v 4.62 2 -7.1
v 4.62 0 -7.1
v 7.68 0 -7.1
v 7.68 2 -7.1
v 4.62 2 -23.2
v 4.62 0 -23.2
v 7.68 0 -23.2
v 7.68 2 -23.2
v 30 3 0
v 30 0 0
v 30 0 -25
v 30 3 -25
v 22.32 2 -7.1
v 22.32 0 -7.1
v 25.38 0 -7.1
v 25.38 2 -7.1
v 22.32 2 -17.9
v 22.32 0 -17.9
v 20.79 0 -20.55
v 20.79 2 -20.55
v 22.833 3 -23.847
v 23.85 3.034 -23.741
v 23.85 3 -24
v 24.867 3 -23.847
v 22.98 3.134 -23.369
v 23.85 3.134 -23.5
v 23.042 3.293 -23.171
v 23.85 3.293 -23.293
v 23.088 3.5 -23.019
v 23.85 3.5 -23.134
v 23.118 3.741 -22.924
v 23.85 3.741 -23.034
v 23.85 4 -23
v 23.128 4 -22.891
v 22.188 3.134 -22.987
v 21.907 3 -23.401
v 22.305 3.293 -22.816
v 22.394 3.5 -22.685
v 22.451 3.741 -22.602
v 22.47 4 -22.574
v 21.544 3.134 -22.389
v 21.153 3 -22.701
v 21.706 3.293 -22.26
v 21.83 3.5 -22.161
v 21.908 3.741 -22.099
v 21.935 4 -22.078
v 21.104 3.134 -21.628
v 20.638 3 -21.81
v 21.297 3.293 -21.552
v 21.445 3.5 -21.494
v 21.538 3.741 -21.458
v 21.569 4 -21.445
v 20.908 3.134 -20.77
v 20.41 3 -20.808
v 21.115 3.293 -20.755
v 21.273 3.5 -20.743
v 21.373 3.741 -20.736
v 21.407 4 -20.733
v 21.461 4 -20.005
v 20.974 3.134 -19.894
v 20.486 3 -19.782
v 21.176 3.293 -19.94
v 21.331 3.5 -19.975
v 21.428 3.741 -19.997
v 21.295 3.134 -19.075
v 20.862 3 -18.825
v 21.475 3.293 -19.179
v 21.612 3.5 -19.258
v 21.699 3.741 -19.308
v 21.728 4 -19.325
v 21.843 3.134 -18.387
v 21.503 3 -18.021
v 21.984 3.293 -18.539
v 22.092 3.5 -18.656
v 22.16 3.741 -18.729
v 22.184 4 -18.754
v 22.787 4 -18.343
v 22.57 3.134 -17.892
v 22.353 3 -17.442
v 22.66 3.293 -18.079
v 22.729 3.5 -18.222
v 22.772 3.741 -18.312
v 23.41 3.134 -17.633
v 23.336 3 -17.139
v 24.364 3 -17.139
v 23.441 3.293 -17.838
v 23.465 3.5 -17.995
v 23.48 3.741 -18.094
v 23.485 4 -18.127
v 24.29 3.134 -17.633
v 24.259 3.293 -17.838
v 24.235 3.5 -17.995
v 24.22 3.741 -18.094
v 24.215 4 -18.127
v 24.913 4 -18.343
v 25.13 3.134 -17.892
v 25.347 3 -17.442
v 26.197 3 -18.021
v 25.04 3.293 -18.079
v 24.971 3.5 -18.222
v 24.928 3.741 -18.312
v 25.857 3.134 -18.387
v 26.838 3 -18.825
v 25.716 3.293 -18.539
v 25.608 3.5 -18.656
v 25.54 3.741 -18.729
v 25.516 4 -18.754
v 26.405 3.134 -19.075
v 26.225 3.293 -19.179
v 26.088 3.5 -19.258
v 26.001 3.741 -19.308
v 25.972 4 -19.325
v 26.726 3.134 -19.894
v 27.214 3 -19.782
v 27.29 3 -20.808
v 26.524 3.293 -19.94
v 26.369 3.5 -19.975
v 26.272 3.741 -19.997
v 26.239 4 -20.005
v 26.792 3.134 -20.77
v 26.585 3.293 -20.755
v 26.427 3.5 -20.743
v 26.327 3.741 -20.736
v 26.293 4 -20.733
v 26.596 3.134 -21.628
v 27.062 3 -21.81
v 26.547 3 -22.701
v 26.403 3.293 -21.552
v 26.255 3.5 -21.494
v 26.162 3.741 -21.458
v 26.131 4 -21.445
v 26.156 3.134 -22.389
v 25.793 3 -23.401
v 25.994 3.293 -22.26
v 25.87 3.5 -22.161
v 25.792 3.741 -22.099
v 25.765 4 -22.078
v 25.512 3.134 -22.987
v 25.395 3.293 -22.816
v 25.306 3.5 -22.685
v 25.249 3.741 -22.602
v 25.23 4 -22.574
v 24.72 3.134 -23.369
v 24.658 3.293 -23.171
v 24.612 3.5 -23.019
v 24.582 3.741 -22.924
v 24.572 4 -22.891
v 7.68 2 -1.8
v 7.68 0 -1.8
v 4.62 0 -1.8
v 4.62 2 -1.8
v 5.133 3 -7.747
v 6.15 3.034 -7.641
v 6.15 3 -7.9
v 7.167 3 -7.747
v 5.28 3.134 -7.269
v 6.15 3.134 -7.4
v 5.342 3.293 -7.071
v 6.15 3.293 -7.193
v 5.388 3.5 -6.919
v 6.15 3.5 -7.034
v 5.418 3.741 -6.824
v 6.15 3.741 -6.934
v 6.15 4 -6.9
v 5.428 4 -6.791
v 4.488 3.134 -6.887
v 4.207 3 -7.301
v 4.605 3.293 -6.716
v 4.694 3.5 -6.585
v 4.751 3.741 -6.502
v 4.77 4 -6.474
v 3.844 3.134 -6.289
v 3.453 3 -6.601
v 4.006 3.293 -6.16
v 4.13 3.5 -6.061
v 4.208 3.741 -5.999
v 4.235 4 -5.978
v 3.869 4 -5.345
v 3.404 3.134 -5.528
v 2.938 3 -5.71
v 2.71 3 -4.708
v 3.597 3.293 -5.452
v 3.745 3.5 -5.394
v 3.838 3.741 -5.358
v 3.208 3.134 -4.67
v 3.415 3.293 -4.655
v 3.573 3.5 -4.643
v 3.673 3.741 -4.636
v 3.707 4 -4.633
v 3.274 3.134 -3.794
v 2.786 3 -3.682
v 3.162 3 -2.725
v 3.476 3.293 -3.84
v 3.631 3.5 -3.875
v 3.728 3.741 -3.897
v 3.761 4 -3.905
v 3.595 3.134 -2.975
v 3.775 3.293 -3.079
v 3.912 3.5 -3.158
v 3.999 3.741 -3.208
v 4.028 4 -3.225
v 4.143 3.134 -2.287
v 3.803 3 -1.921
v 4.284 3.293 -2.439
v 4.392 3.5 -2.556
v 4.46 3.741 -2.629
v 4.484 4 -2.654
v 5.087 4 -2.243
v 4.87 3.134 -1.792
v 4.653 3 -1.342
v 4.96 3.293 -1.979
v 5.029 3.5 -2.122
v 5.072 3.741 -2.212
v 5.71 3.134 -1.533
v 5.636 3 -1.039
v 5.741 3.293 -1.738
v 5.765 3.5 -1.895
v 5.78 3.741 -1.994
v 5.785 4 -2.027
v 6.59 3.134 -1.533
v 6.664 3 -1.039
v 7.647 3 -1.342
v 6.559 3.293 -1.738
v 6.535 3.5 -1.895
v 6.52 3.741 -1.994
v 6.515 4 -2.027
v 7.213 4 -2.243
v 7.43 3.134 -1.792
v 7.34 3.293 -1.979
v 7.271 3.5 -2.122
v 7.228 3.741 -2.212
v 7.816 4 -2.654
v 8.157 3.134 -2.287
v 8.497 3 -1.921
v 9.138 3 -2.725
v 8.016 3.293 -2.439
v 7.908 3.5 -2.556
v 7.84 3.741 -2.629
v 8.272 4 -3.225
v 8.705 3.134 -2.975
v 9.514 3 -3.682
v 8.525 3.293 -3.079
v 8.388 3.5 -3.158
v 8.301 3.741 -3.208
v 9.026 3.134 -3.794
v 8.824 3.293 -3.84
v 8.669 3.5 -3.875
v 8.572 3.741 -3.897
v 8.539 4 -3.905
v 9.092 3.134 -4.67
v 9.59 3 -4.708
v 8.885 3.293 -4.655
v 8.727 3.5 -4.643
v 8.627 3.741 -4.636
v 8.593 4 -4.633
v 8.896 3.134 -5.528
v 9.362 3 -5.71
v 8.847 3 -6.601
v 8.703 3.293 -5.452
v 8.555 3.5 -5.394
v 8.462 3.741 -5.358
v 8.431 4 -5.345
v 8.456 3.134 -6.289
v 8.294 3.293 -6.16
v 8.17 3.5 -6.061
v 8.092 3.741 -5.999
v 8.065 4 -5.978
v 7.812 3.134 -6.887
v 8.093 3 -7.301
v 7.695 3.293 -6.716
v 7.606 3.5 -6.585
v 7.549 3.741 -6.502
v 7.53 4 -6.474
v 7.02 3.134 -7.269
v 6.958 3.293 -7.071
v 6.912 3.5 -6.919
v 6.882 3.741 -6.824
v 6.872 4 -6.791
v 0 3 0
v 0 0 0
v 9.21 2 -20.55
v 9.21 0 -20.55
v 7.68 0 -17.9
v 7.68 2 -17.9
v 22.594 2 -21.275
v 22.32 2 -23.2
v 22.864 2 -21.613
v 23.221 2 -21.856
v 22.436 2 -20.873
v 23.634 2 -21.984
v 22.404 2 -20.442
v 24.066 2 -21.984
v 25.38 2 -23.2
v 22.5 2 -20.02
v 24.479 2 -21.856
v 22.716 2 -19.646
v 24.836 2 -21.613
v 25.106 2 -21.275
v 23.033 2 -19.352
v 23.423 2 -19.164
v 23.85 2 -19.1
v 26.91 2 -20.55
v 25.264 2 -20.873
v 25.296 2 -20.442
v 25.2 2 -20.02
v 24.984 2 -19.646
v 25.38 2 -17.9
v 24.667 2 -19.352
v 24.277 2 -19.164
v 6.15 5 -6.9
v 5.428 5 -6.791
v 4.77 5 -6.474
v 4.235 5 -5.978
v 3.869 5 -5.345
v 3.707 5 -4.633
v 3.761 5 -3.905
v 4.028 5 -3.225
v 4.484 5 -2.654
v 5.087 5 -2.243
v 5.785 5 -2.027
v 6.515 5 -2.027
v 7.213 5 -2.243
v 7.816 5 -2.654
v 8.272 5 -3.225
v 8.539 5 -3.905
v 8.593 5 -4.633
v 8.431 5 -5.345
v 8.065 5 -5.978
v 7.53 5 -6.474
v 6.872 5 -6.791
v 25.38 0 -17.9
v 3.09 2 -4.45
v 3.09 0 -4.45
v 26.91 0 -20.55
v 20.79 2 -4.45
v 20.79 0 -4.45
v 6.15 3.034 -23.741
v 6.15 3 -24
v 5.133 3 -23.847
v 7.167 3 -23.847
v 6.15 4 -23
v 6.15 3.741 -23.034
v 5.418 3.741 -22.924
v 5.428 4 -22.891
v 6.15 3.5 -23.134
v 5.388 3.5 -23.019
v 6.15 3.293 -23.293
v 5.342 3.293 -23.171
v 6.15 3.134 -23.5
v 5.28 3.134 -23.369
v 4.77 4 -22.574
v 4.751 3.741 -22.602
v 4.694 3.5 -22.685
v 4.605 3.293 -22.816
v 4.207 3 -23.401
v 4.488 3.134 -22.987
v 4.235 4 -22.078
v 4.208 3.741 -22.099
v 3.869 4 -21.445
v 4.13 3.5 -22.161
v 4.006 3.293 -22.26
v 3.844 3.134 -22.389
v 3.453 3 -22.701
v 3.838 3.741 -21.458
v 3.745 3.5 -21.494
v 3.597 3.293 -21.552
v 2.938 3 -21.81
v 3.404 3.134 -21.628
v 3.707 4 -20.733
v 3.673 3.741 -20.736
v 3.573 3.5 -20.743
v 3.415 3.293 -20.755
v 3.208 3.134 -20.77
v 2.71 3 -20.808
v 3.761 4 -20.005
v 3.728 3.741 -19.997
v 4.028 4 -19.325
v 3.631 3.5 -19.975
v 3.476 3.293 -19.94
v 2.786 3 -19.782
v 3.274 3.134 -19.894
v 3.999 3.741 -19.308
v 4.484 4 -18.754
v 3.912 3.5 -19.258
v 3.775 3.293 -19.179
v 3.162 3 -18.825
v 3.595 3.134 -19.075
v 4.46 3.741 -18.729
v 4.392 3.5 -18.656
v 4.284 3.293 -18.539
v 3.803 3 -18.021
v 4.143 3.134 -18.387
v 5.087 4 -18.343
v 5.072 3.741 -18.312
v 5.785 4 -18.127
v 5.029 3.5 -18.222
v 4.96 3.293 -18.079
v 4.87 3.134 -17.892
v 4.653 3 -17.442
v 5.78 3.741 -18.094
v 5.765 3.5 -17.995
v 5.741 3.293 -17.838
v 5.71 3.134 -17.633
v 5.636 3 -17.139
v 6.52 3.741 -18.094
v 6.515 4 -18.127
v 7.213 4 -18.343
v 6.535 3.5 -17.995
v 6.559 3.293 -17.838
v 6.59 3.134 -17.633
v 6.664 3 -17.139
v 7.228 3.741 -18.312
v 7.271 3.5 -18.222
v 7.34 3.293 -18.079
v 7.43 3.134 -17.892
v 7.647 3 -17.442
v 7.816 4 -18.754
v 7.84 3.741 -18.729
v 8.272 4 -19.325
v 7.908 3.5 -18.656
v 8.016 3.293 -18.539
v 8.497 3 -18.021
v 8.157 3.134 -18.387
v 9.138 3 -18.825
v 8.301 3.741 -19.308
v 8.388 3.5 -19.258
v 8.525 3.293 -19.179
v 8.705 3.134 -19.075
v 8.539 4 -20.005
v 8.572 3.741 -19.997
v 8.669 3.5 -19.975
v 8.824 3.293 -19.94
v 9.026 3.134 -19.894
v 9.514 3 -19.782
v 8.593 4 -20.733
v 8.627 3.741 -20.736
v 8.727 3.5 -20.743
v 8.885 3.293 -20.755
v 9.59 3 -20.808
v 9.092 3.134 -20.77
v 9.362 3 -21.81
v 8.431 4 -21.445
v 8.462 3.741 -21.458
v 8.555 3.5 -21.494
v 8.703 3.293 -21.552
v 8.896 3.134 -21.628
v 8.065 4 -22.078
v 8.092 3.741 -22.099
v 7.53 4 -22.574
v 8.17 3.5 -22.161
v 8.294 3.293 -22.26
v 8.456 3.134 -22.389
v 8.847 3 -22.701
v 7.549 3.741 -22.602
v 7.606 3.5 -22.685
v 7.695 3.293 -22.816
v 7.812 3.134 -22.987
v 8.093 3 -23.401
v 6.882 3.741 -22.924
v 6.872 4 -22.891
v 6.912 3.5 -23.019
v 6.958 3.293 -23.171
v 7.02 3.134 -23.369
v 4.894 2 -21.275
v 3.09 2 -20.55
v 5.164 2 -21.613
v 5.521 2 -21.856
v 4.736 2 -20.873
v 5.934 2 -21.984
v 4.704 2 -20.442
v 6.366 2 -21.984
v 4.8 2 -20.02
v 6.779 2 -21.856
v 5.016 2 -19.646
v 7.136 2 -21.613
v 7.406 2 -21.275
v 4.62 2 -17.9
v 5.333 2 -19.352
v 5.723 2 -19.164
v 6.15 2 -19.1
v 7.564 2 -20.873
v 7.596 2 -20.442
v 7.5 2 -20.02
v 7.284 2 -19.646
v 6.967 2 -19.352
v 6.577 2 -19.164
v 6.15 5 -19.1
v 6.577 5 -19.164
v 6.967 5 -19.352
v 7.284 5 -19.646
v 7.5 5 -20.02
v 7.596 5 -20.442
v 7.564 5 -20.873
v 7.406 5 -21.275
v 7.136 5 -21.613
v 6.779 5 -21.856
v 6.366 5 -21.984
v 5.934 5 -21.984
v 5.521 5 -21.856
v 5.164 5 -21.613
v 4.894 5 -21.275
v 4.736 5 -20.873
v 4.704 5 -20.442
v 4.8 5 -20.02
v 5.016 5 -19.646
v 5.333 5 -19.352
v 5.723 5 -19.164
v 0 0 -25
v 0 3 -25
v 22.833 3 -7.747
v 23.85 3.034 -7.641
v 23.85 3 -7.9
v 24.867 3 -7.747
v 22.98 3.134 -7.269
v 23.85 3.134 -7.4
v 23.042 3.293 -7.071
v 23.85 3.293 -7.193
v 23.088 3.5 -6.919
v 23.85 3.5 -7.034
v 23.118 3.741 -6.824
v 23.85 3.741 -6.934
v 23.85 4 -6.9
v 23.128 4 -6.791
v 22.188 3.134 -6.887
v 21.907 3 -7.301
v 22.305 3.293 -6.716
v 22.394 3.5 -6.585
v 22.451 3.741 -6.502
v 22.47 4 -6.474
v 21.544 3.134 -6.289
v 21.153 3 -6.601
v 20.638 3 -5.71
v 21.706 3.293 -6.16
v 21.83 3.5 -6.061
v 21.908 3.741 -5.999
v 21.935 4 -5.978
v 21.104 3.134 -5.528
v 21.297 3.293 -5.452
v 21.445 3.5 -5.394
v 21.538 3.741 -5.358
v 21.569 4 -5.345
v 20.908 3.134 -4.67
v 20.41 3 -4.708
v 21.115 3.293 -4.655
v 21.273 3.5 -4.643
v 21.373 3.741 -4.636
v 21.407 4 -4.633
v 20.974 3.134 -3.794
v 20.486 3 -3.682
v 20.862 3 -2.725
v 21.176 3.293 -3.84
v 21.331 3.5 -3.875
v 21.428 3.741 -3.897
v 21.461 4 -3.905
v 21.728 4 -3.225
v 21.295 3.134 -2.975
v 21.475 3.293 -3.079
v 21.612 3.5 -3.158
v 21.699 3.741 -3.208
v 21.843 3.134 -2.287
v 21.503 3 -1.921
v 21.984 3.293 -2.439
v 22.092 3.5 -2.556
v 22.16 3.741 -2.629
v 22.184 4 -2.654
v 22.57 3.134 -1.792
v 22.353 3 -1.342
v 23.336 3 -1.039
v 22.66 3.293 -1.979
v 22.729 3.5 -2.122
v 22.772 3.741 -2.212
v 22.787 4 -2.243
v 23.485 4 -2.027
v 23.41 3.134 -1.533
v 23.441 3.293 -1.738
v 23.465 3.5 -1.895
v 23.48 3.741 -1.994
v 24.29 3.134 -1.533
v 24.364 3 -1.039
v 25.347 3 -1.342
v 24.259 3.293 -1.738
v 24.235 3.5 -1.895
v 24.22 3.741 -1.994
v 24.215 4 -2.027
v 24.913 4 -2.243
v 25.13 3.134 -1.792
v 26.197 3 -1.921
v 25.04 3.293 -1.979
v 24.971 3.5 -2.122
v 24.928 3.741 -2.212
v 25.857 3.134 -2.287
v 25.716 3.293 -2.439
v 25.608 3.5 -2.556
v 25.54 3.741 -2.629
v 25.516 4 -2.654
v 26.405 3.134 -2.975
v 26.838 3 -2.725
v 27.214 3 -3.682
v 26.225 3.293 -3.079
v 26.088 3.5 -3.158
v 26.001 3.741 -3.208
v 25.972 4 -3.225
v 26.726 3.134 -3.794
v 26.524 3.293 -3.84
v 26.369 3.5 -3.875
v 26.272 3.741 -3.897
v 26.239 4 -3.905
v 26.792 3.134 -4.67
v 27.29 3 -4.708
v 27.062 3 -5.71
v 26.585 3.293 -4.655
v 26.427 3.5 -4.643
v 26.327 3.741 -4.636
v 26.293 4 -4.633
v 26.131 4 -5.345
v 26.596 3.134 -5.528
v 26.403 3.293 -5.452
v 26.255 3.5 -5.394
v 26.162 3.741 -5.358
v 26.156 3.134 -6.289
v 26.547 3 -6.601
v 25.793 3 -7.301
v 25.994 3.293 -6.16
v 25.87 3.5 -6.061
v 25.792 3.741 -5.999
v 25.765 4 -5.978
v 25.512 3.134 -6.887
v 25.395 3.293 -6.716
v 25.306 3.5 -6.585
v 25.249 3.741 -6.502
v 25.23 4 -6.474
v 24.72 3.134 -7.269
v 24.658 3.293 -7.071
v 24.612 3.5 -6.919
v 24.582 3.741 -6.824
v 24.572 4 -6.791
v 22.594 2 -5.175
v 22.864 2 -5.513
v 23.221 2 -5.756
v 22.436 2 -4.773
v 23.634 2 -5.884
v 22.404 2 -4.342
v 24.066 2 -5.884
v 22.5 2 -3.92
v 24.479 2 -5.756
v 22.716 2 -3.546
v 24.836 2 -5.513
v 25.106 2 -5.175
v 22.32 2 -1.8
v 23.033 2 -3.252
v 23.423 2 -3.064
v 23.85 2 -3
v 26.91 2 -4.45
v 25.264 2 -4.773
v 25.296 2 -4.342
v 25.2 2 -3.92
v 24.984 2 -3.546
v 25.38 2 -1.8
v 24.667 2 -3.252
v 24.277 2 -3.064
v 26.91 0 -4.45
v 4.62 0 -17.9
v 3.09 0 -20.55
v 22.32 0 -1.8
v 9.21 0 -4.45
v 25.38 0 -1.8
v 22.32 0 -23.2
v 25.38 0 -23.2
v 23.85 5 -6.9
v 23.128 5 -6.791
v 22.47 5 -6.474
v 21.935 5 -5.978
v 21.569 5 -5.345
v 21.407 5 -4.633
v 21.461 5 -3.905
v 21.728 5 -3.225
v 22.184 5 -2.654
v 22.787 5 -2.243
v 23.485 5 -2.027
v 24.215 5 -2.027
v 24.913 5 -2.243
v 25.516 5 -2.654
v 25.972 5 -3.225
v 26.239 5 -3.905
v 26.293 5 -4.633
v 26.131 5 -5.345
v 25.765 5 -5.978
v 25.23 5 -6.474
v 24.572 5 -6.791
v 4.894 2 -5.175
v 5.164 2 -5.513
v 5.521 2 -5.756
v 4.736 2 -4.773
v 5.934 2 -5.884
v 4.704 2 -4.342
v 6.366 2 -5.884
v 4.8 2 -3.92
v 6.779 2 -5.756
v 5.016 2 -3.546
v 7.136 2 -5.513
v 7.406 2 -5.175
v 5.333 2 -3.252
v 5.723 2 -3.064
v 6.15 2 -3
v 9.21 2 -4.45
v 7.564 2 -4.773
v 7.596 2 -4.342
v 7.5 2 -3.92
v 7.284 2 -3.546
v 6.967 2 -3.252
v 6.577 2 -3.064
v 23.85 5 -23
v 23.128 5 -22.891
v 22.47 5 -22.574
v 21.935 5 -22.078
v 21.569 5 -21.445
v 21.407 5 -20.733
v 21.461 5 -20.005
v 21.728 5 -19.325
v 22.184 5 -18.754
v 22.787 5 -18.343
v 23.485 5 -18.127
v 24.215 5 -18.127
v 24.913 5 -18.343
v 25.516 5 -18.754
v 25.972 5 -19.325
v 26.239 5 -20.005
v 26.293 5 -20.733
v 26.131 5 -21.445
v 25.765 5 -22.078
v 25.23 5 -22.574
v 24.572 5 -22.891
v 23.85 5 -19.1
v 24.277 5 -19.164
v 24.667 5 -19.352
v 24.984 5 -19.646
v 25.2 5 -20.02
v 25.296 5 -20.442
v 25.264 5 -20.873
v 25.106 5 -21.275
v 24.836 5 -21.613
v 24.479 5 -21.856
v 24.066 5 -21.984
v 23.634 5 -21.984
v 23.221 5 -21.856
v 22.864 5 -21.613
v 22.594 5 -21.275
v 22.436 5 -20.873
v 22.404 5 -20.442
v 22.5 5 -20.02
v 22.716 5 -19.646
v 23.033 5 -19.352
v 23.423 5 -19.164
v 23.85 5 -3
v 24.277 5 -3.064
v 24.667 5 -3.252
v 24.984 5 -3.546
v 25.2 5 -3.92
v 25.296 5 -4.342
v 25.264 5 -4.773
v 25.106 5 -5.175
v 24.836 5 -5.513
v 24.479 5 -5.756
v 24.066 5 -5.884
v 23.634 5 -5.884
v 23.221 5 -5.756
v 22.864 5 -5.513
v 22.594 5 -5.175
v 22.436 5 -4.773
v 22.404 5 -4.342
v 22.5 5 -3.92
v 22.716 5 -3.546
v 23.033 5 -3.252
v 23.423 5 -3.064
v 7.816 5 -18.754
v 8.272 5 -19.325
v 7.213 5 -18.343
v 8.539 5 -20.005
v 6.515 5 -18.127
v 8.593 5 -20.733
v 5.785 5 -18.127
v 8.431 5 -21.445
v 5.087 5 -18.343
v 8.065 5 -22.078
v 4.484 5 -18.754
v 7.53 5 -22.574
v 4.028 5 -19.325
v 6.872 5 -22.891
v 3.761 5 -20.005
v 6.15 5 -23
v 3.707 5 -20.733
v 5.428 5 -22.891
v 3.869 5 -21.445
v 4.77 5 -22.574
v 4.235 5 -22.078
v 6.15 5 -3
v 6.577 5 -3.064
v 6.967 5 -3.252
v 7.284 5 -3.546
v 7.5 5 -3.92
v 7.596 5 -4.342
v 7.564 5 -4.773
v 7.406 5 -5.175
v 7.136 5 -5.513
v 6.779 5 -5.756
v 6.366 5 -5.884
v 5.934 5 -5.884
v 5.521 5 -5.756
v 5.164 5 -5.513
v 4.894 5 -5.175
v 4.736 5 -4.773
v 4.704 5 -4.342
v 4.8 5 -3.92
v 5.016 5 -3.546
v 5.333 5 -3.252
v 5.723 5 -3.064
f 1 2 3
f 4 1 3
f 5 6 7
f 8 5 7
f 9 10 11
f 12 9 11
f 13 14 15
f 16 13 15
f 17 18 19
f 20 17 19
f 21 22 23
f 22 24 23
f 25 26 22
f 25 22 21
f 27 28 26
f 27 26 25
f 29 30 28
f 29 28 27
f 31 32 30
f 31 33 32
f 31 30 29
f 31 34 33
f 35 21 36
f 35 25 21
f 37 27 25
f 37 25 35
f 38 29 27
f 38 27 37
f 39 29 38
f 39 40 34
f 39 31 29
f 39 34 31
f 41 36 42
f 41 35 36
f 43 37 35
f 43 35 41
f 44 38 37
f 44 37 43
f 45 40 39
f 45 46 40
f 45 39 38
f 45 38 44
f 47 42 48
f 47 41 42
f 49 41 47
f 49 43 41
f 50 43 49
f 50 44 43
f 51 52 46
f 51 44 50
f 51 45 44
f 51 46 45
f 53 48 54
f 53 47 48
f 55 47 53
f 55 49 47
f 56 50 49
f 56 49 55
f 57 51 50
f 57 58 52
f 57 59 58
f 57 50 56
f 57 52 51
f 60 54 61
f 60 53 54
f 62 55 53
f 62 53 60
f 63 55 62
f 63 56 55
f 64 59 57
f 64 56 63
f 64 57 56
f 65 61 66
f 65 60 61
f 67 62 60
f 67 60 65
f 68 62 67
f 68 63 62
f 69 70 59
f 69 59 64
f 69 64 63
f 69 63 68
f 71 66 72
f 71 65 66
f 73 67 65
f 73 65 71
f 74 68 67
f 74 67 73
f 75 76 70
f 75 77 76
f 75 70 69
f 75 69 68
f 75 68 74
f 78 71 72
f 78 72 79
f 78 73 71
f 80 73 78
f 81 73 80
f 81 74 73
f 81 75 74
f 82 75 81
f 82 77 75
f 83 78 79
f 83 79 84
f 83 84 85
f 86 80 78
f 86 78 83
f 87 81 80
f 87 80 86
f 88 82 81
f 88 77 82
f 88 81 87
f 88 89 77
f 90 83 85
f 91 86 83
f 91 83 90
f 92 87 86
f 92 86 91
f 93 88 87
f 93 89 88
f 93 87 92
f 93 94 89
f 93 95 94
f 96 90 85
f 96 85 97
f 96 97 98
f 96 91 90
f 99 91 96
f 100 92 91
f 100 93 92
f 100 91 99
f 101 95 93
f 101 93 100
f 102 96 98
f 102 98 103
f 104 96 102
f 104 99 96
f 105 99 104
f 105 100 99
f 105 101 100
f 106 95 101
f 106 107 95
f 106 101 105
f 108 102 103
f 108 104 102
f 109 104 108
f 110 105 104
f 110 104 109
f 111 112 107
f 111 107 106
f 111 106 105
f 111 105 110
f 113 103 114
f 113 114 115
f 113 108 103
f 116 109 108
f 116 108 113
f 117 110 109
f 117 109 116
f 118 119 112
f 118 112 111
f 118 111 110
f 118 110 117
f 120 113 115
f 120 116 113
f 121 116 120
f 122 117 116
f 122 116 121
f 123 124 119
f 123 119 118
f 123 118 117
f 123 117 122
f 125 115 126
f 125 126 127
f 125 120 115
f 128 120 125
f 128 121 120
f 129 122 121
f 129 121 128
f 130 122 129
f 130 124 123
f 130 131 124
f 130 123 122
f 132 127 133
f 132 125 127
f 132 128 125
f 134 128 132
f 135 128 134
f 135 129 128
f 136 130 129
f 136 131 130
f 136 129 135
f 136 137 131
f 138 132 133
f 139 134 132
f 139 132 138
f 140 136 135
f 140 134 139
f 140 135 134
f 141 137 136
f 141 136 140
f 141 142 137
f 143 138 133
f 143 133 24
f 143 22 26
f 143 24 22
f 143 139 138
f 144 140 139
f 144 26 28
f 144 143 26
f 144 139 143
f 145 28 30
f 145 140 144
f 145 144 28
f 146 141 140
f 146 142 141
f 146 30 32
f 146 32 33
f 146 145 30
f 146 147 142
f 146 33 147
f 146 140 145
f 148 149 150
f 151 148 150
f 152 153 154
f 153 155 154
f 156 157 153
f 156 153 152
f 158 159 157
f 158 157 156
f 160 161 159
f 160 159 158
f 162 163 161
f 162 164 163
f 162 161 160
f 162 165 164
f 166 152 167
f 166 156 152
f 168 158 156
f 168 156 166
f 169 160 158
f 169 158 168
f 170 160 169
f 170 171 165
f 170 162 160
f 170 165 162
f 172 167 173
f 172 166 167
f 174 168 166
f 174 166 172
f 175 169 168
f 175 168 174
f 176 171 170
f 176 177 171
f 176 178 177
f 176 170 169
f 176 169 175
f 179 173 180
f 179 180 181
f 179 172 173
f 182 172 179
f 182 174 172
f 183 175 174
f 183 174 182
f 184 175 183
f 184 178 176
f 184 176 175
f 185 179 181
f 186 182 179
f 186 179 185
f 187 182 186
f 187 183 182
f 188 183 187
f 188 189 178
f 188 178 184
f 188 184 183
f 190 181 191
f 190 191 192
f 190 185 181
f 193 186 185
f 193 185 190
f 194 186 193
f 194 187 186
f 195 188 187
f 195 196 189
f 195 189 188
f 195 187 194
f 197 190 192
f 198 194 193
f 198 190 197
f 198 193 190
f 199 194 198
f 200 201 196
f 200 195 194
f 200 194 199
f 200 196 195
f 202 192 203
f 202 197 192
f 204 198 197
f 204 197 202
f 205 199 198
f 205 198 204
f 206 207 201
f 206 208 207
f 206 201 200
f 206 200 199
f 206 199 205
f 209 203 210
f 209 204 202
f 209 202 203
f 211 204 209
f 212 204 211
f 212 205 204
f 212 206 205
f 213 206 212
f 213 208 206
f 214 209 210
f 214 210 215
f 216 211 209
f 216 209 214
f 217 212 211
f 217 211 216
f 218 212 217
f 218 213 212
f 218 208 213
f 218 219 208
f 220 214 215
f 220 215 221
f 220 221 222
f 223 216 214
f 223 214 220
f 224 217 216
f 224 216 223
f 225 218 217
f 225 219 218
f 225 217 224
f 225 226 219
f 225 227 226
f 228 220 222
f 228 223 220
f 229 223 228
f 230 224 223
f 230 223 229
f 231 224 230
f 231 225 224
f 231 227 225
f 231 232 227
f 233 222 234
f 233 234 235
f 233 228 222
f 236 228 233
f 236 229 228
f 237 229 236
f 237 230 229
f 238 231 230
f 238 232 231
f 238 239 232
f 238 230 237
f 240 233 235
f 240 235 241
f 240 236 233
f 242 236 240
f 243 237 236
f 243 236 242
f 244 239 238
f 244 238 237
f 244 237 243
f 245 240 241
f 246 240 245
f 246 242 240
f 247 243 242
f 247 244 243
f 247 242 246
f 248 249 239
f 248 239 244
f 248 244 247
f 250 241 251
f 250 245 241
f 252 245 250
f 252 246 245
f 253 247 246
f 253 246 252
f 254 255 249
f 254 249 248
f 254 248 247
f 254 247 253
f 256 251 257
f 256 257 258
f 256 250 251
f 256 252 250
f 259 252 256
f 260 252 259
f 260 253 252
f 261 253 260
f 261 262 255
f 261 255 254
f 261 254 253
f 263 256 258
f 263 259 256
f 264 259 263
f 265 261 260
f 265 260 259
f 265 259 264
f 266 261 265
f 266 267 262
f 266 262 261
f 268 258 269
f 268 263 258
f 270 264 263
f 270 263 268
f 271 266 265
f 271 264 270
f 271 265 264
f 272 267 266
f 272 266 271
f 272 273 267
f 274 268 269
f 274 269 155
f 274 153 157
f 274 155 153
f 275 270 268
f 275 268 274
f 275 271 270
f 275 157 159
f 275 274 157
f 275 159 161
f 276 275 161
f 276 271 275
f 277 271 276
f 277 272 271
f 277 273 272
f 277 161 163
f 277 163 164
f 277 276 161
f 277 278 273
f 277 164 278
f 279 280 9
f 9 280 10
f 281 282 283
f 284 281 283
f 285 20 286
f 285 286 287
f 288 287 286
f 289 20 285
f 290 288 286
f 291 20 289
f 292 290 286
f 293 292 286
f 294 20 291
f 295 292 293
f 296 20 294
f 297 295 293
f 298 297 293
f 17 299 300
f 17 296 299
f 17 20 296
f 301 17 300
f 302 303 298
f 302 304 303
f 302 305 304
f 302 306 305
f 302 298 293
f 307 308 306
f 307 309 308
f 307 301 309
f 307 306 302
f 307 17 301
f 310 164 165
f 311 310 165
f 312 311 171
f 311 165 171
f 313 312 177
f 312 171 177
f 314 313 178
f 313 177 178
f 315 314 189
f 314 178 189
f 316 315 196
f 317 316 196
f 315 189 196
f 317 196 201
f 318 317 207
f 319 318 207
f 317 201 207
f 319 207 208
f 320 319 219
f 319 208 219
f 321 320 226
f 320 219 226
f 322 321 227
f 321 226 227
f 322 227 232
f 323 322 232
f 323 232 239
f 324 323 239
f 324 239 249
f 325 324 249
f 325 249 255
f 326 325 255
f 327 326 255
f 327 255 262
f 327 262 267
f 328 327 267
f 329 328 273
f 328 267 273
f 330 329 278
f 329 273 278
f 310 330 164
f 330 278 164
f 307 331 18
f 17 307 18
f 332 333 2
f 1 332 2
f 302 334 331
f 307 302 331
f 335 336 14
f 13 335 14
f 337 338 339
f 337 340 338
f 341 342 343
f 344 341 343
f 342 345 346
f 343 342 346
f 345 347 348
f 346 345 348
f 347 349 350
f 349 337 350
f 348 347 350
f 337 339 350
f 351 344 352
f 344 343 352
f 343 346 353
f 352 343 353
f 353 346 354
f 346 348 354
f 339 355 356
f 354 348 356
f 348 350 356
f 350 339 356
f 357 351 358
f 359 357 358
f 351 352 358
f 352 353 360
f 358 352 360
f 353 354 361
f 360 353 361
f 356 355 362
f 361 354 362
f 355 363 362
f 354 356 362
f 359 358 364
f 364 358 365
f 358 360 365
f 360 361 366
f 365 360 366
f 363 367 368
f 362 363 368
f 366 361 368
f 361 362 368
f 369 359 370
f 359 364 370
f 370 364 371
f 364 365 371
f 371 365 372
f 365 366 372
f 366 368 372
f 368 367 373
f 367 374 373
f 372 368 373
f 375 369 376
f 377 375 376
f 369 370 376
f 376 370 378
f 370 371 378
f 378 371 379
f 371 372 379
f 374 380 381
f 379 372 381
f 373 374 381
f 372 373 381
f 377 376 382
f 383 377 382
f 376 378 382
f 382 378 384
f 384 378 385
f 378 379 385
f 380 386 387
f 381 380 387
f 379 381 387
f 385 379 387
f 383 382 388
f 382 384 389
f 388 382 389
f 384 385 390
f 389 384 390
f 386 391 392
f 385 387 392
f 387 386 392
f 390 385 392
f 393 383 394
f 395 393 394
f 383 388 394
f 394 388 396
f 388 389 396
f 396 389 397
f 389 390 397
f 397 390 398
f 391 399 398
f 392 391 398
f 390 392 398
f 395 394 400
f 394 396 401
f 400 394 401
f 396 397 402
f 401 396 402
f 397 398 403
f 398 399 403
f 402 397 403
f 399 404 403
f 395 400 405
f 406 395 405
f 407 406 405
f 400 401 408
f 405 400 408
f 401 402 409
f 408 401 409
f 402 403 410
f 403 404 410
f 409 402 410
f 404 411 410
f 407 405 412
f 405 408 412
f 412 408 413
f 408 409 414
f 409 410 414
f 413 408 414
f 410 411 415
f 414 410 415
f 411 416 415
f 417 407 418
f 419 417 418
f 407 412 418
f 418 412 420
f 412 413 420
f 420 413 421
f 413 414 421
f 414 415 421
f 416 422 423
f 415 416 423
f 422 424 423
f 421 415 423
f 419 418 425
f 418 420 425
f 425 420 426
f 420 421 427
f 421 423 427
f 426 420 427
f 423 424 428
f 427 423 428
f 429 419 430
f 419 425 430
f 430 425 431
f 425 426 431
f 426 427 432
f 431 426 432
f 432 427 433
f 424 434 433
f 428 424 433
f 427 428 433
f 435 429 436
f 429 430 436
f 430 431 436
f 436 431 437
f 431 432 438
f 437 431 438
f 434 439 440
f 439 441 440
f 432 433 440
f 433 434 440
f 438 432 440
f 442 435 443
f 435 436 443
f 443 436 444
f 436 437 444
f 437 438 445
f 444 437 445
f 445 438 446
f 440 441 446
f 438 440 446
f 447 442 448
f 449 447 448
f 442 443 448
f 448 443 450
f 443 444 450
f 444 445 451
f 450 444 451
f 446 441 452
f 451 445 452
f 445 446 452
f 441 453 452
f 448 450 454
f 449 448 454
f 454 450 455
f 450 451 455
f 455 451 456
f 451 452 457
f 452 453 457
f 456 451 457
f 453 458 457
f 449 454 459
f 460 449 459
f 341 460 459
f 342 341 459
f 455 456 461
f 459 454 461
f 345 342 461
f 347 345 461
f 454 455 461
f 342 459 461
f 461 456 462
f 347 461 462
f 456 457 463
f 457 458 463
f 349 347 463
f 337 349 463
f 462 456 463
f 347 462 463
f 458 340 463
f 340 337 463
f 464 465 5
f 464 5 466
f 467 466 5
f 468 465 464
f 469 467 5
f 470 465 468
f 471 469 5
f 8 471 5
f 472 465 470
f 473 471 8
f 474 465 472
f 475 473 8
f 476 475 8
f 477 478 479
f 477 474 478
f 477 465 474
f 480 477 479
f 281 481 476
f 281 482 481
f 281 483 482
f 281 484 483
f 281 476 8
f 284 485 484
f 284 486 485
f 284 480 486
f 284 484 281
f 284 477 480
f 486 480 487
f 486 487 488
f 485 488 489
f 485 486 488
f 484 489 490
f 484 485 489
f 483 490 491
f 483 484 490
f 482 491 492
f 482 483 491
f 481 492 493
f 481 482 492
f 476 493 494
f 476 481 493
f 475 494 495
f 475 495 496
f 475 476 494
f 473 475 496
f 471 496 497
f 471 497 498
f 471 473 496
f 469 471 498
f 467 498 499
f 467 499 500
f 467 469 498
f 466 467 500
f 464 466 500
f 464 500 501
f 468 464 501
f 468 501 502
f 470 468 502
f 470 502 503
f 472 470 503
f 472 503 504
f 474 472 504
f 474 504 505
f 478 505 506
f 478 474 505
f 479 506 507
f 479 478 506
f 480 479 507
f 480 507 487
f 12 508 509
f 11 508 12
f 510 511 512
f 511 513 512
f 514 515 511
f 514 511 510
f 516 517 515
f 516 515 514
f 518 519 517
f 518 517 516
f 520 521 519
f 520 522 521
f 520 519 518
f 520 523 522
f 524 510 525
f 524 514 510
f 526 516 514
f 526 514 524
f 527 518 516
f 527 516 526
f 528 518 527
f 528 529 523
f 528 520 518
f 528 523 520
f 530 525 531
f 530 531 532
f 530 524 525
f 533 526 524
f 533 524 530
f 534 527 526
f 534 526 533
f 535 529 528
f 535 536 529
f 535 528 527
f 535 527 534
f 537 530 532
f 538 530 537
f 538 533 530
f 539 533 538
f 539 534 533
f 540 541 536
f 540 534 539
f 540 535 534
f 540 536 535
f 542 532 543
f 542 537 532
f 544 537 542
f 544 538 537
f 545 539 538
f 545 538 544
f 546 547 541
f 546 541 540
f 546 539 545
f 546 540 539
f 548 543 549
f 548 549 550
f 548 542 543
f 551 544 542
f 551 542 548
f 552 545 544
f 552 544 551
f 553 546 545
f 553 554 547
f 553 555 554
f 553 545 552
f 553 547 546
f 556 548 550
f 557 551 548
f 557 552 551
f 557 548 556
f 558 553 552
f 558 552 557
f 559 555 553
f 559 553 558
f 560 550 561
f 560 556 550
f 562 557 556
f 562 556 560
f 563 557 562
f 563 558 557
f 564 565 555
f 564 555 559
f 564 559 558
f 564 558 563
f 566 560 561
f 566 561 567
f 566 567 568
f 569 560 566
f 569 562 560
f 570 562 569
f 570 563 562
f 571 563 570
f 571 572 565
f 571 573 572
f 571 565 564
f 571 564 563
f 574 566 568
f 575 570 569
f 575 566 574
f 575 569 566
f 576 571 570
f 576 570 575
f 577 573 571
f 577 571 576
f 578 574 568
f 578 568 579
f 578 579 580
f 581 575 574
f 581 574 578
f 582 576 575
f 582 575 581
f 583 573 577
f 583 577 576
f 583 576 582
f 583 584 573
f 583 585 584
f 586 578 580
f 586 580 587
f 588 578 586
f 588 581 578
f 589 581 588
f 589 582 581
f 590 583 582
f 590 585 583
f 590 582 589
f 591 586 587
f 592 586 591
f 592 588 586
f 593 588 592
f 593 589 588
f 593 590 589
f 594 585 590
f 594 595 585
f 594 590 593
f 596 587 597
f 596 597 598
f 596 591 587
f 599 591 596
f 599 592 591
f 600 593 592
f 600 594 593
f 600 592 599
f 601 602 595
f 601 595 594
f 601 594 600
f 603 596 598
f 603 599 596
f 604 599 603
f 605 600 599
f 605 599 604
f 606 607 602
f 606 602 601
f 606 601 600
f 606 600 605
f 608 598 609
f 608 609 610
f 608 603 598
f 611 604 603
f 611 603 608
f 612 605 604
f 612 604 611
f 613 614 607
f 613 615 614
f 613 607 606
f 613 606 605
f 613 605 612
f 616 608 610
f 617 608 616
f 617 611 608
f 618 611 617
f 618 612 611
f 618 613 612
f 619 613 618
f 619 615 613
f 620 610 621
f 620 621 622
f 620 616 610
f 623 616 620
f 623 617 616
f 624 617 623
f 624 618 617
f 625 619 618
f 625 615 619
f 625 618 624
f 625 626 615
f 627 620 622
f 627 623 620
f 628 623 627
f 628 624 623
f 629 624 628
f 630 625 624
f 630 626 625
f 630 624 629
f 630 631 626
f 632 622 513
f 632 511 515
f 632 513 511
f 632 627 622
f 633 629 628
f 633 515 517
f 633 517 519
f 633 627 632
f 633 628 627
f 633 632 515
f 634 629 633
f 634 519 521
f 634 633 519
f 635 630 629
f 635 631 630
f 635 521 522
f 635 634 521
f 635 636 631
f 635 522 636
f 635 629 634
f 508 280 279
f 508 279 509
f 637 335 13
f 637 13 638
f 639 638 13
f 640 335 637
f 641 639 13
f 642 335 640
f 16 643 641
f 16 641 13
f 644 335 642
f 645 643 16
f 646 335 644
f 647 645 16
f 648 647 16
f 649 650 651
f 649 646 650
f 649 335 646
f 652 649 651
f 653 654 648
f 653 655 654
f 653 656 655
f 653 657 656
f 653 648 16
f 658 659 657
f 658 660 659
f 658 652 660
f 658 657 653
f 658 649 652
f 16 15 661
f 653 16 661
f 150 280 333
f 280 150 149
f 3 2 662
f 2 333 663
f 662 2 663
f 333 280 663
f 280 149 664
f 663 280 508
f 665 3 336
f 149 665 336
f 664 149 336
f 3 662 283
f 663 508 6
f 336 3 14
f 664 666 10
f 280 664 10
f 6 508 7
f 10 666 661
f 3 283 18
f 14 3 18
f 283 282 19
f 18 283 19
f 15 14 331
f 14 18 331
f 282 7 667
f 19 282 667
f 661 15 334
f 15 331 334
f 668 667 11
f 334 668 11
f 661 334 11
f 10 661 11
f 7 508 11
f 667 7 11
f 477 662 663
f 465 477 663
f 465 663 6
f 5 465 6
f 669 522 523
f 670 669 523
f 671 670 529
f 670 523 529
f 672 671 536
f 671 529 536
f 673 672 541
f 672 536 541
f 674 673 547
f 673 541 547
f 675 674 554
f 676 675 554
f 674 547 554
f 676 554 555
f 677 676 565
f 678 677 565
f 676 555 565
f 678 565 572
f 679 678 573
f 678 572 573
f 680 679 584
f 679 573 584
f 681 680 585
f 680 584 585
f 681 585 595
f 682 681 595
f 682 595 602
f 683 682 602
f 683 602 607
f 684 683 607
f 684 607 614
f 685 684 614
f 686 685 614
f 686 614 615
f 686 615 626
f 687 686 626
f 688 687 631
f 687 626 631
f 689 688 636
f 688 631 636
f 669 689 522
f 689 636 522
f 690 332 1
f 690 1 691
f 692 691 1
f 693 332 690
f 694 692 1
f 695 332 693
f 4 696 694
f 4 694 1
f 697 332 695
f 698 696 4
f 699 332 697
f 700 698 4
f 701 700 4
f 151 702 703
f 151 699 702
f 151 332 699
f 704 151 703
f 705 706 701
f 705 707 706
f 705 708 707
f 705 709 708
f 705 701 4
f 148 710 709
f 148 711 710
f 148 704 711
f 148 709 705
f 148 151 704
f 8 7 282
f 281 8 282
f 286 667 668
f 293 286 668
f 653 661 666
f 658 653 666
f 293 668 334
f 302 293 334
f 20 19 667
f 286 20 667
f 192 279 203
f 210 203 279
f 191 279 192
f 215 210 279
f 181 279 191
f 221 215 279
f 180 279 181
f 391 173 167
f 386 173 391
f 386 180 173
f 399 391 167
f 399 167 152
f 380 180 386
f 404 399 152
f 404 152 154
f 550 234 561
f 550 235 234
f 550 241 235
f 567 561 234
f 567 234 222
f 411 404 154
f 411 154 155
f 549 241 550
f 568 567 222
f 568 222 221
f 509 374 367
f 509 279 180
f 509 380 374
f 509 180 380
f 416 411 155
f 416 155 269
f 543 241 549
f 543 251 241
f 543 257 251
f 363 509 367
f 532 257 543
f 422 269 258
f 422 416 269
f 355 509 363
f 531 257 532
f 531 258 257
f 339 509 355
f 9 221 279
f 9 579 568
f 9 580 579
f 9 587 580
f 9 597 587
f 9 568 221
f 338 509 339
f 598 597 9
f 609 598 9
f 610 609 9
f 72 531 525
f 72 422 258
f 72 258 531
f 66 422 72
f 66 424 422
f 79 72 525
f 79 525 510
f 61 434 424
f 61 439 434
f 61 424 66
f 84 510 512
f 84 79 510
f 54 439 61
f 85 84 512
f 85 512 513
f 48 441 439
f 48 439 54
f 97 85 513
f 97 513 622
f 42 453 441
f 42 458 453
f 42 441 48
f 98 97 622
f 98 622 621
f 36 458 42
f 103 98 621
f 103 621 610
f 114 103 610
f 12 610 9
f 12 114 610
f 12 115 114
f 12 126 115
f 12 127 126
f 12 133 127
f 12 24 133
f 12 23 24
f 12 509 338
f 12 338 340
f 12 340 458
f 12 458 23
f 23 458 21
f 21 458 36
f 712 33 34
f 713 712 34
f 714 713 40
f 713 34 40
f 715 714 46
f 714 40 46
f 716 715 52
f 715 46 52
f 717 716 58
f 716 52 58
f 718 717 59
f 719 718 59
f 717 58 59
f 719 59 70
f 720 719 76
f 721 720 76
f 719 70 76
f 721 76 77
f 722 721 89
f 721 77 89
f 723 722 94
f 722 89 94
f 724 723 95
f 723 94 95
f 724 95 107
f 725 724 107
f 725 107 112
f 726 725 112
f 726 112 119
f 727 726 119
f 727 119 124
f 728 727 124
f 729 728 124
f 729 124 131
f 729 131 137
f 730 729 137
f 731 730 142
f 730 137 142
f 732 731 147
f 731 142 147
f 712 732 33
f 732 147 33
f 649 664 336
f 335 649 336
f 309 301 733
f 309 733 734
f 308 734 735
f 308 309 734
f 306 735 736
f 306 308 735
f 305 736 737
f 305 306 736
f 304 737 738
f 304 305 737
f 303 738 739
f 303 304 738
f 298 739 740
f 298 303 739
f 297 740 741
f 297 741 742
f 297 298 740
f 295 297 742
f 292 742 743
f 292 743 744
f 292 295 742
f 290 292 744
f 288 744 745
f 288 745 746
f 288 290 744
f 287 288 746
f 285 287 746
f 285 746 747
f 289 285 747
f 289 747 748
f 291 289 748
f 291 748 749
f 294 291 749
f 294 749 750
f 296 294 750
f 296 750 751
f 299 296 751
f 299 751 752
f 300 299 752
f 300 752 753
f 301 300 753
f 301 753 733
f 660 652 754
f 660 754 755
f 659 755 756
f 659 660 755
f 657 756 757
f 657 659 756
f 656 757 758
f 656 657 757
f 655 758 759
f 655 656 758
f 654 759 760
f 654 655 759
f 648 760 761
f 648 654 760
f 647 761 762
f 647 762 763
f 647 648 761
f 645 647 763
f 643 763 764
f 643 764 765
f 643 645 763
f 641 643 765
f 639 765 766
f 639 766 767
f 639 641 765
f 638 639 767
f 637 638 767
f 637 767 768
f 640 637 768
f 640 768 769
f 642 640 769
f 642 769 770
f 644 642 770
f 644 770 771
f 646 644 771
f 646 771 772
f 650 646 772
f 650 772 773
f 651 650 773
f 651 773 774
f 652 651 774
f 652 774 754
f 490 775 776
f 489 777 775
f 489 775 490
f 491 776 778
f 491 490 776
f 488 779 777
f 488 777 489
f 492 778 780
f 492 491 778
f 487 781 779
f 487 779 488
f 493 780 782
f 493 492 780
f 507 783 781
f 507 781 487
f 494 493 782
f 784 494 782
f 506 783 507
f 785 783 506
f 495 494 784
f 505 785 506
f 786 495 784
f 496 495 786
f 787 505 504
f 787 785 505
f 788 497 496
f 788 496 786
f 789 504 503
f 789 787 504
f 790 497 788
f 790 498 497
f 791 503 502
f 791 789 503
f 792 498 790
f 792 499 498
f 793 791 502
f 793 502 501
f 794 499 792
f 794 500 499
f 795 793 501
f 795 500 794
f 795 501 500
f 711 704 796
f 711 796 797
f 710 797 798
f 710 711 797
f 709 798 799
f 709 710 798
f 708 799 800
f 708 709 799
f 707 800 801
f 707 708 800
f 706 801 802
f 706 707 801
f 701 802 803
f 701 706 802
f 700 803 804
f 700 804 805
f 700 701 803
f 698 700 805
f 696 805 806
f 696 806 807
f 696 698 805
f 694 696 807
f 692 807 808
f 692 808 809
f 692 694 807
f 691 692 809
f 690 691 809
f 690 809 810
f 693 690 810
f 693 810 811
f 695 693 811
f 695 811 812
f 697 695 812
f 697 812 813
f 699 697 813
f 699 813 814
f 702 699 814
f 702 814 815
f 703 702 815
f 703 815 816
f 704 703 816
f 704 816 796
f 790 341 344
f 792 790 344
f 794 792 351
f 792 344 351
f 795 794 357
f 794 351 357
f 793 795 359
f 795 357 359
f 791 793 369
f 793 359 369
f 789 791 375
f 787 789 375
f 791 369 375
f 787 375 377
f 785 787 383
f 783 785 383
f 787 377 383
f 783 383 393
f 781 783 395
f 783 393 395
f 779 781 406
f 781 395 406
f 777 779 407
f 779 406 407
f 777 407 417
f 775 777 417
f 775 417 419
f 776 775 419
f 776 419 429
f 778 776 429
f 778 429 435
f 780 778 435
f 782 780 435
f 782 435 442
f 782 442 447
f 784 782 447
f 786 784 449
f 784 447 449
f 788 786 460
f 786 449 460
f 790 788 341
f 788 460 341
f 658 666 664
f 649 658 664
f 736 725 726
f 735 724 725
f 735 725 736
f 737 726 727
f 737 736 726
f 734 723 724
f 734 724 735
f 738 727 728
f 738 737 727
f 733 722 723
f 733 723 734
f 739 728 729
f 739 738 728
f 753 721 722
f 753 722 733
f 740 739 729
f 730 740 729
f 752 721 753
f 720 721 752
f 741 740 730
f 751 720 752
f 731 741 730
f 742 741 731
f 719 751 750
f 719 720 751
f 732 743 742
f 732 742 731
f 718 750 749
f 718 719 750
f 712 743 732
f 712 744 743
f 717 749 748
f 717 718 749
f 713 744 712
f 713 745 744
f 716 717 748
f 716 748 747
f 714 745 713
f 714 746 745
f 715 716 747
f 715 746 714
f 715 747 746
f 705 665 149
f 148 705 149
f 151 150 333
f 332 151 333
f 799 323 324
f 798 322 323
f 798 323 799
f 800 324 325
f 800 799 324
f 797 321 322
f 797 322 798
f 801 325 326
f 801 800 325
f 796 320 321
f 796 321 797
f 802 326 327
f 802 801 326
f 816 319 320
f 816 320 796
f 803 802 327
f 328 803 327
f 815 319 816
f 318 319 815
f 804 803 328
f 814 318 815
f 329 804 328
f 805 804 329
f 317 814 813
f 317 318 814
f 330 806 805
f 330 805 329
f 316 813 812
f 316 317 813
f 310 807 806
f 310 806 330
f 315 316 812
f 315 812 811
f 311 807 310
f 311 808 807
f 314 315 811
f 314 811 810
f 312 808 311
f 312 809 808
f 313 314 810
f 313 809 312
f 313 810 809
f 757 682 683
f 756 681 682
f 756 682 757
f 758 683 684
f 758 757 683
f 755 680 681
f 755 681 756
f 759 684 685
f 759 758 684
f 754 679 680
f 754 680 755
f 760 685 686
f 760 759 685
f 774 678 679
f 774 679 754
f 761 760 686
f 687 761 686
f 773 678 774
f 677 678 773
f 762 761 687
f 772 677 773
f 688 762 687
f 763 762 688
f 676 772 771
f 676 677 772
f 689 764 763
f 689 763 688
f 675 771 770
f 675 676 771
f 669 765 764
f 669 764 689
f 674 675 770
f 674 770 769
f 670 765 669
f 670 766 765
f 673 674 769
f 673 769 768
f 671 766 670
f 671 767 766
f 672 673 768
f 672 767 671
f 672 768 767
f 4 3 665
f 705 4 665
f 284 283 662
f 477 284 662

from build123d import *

# Parameters (mm, degrees)
SKETCH1_W           = 30
SKETCH1_H           = 25
SKETCH1_R           = 1.45
BOSS_EXTRUDE1_DEPTH = 3
SKETCH2_R           = 2.45
SKETCH2_R_2         = 1.45
BOSS_EXTRUDE2_DEPTH = 2
CUT_EXTRUDE1_DEPTH  = 2
FILLET1_R           = 1


with BuildPart() as part:
    # Sketch1 → Boss-Extrude1 (new body)
    with BuildSketch(Plane(origin=(0, 0, 0), x_dir=(1, 0, 0), z_dir=(0, 1, 0))):
        with Locations((15, 12.5)):
            Rectangle(SKETCH1_W, SKETCH1_H)
        with Locations(Location((6.15, 20.55, 0), (0, 0, 270))):
            Circle(SKETCH1_R, mode=Mode.SUBTRACT)
        with Locations(Location((23.85, 20.55, 0), (0, 0, 270))):
            Circle(SKETCH1_R, mode=Mode.SUBTRACT)
        with Locations(Location((6.15, 4.45, 0), (0, 0, 270))):
            Circle(SKETCH1_R, mode=Mode.SUBTRACT)
        with Locations(Location((23.85, 4.45, 0), (0, 0, 270))):
            Circle(SKETCH1_R, mode=Mode.SUBTRACT)
    extrude(amount=BOSS_EXTRUDE1_DEPTH)

    # Sketch2 → Boss-Extrude2 (add)
    # profile 1 of 4: a face of its own
    with BuildSketch(Plane(origin=(0, 3, 0), x_dir=(1, 0, 0), z_dir=(0, 1, 0))):
        with Locations(Location((6.15, 20.55, 0), (0, 0, 90))):
            Circle(SKETCH2_R)
        with Locations(Location((6.15, 20.55, 0), (0, 0, 270))):
            Circle(SKETCH2_R_2, mode=Mode.SUBTRACT)
    # profile 2 of 4: a face of its own
    with BuildSketch(Plane(origin=(0, 3, 0), x_dir=(1, 0, 0), z_dir=(0, 1, 0))):
        with Locations(Location((23.85, 20.55, 0), (0, 0, 90))):
            Circle(SKETCH2_R)
        with Locations(Location((23.85, 20.55, 0), (0, 0, 270))):
            Circle(SKETCH2_R_2, mode=Mode.SUBTRACT)
    # profile 3 of 4: a face of its own
    with BuildSketch(Plane(origin=(0, 3, 0), x_dir=(1, 0, 0), z_dir=(0, 1, 0))):
        with Locations(Location((6.15, 4.45, 0), (0, 0, 90))):
            Circle(SKETCH2_R)
        with Locations(Location((6.15, 4.45, 0), (0, 0, 270))):
            Circle(SKETCH2_R_2, mode=Mode.SUBTRACT)
    # profile 4 of 4: a face of its own
    with BuildSketch(Plane(origin=(0, 3, 0), x_dir=(1, 0, 0), z_dir=(0, 1, 0))):
        with Locations(Location((23.85, 4.45, 0), (0, 0, 90))):
            Circle(SKETCH2_R)
        with Locations(Location((23.85, 4.45, 0), (0, 0, 270))):
            Circle(SKETCH2_R_2, mode=Mode.SUBTRACT)
    extrude(amount=BOSS_EXTRUDE2_DEPTH)

    # Sketch3 → Cut-Extrude1 (cut)
    with BuildSketch(Plane.XZ):
        Polygon((7.679978213, -7.1), (9.209956427, -4.45), (7.679978213, -1.8), (4.620021787, -1.8), (3.090043573, -4.45), (4.620021787, -7.1), align=None)
        Polygon((25.379978213, -7.1), (26.909956427, -4.45), (25.379978213, -1.8), (22.320021787, -1.8), (20.790043573, -4.45), (22.320021787, -7.1), align=None)
        Polygon((25.379978213, -23.2), (26.909956427, -20.55), (25.379978213, -17.9), (22.320021787, -17.9), (20.790043573, -20.55), (22.320021787, -23.2), align=None)
        Polygon((7.679978213, -23.2), (9.209956427, -20.55), (7.679978213, -17.9), (4.620021787, -17.9), (3.090043573, -20.55), (4.620021787, -23.2), align=None)
    extrude(amount=-CUT_EXTRUDE1_DEPTH, mode=Mode.SUBTRACT)

    # Fillet1
    fillet1_edges = [part.edges().sort_by_distance(p)[0] for p in [
        (6.15, 3, -18.1),
        (23.85, 3, -18.1),
        (6.15, 3, -2),
        (23.85, 3, -2),
    ]]
    fillet(fillet1_edges, radius=FILLET1_R)


solid = part.part
